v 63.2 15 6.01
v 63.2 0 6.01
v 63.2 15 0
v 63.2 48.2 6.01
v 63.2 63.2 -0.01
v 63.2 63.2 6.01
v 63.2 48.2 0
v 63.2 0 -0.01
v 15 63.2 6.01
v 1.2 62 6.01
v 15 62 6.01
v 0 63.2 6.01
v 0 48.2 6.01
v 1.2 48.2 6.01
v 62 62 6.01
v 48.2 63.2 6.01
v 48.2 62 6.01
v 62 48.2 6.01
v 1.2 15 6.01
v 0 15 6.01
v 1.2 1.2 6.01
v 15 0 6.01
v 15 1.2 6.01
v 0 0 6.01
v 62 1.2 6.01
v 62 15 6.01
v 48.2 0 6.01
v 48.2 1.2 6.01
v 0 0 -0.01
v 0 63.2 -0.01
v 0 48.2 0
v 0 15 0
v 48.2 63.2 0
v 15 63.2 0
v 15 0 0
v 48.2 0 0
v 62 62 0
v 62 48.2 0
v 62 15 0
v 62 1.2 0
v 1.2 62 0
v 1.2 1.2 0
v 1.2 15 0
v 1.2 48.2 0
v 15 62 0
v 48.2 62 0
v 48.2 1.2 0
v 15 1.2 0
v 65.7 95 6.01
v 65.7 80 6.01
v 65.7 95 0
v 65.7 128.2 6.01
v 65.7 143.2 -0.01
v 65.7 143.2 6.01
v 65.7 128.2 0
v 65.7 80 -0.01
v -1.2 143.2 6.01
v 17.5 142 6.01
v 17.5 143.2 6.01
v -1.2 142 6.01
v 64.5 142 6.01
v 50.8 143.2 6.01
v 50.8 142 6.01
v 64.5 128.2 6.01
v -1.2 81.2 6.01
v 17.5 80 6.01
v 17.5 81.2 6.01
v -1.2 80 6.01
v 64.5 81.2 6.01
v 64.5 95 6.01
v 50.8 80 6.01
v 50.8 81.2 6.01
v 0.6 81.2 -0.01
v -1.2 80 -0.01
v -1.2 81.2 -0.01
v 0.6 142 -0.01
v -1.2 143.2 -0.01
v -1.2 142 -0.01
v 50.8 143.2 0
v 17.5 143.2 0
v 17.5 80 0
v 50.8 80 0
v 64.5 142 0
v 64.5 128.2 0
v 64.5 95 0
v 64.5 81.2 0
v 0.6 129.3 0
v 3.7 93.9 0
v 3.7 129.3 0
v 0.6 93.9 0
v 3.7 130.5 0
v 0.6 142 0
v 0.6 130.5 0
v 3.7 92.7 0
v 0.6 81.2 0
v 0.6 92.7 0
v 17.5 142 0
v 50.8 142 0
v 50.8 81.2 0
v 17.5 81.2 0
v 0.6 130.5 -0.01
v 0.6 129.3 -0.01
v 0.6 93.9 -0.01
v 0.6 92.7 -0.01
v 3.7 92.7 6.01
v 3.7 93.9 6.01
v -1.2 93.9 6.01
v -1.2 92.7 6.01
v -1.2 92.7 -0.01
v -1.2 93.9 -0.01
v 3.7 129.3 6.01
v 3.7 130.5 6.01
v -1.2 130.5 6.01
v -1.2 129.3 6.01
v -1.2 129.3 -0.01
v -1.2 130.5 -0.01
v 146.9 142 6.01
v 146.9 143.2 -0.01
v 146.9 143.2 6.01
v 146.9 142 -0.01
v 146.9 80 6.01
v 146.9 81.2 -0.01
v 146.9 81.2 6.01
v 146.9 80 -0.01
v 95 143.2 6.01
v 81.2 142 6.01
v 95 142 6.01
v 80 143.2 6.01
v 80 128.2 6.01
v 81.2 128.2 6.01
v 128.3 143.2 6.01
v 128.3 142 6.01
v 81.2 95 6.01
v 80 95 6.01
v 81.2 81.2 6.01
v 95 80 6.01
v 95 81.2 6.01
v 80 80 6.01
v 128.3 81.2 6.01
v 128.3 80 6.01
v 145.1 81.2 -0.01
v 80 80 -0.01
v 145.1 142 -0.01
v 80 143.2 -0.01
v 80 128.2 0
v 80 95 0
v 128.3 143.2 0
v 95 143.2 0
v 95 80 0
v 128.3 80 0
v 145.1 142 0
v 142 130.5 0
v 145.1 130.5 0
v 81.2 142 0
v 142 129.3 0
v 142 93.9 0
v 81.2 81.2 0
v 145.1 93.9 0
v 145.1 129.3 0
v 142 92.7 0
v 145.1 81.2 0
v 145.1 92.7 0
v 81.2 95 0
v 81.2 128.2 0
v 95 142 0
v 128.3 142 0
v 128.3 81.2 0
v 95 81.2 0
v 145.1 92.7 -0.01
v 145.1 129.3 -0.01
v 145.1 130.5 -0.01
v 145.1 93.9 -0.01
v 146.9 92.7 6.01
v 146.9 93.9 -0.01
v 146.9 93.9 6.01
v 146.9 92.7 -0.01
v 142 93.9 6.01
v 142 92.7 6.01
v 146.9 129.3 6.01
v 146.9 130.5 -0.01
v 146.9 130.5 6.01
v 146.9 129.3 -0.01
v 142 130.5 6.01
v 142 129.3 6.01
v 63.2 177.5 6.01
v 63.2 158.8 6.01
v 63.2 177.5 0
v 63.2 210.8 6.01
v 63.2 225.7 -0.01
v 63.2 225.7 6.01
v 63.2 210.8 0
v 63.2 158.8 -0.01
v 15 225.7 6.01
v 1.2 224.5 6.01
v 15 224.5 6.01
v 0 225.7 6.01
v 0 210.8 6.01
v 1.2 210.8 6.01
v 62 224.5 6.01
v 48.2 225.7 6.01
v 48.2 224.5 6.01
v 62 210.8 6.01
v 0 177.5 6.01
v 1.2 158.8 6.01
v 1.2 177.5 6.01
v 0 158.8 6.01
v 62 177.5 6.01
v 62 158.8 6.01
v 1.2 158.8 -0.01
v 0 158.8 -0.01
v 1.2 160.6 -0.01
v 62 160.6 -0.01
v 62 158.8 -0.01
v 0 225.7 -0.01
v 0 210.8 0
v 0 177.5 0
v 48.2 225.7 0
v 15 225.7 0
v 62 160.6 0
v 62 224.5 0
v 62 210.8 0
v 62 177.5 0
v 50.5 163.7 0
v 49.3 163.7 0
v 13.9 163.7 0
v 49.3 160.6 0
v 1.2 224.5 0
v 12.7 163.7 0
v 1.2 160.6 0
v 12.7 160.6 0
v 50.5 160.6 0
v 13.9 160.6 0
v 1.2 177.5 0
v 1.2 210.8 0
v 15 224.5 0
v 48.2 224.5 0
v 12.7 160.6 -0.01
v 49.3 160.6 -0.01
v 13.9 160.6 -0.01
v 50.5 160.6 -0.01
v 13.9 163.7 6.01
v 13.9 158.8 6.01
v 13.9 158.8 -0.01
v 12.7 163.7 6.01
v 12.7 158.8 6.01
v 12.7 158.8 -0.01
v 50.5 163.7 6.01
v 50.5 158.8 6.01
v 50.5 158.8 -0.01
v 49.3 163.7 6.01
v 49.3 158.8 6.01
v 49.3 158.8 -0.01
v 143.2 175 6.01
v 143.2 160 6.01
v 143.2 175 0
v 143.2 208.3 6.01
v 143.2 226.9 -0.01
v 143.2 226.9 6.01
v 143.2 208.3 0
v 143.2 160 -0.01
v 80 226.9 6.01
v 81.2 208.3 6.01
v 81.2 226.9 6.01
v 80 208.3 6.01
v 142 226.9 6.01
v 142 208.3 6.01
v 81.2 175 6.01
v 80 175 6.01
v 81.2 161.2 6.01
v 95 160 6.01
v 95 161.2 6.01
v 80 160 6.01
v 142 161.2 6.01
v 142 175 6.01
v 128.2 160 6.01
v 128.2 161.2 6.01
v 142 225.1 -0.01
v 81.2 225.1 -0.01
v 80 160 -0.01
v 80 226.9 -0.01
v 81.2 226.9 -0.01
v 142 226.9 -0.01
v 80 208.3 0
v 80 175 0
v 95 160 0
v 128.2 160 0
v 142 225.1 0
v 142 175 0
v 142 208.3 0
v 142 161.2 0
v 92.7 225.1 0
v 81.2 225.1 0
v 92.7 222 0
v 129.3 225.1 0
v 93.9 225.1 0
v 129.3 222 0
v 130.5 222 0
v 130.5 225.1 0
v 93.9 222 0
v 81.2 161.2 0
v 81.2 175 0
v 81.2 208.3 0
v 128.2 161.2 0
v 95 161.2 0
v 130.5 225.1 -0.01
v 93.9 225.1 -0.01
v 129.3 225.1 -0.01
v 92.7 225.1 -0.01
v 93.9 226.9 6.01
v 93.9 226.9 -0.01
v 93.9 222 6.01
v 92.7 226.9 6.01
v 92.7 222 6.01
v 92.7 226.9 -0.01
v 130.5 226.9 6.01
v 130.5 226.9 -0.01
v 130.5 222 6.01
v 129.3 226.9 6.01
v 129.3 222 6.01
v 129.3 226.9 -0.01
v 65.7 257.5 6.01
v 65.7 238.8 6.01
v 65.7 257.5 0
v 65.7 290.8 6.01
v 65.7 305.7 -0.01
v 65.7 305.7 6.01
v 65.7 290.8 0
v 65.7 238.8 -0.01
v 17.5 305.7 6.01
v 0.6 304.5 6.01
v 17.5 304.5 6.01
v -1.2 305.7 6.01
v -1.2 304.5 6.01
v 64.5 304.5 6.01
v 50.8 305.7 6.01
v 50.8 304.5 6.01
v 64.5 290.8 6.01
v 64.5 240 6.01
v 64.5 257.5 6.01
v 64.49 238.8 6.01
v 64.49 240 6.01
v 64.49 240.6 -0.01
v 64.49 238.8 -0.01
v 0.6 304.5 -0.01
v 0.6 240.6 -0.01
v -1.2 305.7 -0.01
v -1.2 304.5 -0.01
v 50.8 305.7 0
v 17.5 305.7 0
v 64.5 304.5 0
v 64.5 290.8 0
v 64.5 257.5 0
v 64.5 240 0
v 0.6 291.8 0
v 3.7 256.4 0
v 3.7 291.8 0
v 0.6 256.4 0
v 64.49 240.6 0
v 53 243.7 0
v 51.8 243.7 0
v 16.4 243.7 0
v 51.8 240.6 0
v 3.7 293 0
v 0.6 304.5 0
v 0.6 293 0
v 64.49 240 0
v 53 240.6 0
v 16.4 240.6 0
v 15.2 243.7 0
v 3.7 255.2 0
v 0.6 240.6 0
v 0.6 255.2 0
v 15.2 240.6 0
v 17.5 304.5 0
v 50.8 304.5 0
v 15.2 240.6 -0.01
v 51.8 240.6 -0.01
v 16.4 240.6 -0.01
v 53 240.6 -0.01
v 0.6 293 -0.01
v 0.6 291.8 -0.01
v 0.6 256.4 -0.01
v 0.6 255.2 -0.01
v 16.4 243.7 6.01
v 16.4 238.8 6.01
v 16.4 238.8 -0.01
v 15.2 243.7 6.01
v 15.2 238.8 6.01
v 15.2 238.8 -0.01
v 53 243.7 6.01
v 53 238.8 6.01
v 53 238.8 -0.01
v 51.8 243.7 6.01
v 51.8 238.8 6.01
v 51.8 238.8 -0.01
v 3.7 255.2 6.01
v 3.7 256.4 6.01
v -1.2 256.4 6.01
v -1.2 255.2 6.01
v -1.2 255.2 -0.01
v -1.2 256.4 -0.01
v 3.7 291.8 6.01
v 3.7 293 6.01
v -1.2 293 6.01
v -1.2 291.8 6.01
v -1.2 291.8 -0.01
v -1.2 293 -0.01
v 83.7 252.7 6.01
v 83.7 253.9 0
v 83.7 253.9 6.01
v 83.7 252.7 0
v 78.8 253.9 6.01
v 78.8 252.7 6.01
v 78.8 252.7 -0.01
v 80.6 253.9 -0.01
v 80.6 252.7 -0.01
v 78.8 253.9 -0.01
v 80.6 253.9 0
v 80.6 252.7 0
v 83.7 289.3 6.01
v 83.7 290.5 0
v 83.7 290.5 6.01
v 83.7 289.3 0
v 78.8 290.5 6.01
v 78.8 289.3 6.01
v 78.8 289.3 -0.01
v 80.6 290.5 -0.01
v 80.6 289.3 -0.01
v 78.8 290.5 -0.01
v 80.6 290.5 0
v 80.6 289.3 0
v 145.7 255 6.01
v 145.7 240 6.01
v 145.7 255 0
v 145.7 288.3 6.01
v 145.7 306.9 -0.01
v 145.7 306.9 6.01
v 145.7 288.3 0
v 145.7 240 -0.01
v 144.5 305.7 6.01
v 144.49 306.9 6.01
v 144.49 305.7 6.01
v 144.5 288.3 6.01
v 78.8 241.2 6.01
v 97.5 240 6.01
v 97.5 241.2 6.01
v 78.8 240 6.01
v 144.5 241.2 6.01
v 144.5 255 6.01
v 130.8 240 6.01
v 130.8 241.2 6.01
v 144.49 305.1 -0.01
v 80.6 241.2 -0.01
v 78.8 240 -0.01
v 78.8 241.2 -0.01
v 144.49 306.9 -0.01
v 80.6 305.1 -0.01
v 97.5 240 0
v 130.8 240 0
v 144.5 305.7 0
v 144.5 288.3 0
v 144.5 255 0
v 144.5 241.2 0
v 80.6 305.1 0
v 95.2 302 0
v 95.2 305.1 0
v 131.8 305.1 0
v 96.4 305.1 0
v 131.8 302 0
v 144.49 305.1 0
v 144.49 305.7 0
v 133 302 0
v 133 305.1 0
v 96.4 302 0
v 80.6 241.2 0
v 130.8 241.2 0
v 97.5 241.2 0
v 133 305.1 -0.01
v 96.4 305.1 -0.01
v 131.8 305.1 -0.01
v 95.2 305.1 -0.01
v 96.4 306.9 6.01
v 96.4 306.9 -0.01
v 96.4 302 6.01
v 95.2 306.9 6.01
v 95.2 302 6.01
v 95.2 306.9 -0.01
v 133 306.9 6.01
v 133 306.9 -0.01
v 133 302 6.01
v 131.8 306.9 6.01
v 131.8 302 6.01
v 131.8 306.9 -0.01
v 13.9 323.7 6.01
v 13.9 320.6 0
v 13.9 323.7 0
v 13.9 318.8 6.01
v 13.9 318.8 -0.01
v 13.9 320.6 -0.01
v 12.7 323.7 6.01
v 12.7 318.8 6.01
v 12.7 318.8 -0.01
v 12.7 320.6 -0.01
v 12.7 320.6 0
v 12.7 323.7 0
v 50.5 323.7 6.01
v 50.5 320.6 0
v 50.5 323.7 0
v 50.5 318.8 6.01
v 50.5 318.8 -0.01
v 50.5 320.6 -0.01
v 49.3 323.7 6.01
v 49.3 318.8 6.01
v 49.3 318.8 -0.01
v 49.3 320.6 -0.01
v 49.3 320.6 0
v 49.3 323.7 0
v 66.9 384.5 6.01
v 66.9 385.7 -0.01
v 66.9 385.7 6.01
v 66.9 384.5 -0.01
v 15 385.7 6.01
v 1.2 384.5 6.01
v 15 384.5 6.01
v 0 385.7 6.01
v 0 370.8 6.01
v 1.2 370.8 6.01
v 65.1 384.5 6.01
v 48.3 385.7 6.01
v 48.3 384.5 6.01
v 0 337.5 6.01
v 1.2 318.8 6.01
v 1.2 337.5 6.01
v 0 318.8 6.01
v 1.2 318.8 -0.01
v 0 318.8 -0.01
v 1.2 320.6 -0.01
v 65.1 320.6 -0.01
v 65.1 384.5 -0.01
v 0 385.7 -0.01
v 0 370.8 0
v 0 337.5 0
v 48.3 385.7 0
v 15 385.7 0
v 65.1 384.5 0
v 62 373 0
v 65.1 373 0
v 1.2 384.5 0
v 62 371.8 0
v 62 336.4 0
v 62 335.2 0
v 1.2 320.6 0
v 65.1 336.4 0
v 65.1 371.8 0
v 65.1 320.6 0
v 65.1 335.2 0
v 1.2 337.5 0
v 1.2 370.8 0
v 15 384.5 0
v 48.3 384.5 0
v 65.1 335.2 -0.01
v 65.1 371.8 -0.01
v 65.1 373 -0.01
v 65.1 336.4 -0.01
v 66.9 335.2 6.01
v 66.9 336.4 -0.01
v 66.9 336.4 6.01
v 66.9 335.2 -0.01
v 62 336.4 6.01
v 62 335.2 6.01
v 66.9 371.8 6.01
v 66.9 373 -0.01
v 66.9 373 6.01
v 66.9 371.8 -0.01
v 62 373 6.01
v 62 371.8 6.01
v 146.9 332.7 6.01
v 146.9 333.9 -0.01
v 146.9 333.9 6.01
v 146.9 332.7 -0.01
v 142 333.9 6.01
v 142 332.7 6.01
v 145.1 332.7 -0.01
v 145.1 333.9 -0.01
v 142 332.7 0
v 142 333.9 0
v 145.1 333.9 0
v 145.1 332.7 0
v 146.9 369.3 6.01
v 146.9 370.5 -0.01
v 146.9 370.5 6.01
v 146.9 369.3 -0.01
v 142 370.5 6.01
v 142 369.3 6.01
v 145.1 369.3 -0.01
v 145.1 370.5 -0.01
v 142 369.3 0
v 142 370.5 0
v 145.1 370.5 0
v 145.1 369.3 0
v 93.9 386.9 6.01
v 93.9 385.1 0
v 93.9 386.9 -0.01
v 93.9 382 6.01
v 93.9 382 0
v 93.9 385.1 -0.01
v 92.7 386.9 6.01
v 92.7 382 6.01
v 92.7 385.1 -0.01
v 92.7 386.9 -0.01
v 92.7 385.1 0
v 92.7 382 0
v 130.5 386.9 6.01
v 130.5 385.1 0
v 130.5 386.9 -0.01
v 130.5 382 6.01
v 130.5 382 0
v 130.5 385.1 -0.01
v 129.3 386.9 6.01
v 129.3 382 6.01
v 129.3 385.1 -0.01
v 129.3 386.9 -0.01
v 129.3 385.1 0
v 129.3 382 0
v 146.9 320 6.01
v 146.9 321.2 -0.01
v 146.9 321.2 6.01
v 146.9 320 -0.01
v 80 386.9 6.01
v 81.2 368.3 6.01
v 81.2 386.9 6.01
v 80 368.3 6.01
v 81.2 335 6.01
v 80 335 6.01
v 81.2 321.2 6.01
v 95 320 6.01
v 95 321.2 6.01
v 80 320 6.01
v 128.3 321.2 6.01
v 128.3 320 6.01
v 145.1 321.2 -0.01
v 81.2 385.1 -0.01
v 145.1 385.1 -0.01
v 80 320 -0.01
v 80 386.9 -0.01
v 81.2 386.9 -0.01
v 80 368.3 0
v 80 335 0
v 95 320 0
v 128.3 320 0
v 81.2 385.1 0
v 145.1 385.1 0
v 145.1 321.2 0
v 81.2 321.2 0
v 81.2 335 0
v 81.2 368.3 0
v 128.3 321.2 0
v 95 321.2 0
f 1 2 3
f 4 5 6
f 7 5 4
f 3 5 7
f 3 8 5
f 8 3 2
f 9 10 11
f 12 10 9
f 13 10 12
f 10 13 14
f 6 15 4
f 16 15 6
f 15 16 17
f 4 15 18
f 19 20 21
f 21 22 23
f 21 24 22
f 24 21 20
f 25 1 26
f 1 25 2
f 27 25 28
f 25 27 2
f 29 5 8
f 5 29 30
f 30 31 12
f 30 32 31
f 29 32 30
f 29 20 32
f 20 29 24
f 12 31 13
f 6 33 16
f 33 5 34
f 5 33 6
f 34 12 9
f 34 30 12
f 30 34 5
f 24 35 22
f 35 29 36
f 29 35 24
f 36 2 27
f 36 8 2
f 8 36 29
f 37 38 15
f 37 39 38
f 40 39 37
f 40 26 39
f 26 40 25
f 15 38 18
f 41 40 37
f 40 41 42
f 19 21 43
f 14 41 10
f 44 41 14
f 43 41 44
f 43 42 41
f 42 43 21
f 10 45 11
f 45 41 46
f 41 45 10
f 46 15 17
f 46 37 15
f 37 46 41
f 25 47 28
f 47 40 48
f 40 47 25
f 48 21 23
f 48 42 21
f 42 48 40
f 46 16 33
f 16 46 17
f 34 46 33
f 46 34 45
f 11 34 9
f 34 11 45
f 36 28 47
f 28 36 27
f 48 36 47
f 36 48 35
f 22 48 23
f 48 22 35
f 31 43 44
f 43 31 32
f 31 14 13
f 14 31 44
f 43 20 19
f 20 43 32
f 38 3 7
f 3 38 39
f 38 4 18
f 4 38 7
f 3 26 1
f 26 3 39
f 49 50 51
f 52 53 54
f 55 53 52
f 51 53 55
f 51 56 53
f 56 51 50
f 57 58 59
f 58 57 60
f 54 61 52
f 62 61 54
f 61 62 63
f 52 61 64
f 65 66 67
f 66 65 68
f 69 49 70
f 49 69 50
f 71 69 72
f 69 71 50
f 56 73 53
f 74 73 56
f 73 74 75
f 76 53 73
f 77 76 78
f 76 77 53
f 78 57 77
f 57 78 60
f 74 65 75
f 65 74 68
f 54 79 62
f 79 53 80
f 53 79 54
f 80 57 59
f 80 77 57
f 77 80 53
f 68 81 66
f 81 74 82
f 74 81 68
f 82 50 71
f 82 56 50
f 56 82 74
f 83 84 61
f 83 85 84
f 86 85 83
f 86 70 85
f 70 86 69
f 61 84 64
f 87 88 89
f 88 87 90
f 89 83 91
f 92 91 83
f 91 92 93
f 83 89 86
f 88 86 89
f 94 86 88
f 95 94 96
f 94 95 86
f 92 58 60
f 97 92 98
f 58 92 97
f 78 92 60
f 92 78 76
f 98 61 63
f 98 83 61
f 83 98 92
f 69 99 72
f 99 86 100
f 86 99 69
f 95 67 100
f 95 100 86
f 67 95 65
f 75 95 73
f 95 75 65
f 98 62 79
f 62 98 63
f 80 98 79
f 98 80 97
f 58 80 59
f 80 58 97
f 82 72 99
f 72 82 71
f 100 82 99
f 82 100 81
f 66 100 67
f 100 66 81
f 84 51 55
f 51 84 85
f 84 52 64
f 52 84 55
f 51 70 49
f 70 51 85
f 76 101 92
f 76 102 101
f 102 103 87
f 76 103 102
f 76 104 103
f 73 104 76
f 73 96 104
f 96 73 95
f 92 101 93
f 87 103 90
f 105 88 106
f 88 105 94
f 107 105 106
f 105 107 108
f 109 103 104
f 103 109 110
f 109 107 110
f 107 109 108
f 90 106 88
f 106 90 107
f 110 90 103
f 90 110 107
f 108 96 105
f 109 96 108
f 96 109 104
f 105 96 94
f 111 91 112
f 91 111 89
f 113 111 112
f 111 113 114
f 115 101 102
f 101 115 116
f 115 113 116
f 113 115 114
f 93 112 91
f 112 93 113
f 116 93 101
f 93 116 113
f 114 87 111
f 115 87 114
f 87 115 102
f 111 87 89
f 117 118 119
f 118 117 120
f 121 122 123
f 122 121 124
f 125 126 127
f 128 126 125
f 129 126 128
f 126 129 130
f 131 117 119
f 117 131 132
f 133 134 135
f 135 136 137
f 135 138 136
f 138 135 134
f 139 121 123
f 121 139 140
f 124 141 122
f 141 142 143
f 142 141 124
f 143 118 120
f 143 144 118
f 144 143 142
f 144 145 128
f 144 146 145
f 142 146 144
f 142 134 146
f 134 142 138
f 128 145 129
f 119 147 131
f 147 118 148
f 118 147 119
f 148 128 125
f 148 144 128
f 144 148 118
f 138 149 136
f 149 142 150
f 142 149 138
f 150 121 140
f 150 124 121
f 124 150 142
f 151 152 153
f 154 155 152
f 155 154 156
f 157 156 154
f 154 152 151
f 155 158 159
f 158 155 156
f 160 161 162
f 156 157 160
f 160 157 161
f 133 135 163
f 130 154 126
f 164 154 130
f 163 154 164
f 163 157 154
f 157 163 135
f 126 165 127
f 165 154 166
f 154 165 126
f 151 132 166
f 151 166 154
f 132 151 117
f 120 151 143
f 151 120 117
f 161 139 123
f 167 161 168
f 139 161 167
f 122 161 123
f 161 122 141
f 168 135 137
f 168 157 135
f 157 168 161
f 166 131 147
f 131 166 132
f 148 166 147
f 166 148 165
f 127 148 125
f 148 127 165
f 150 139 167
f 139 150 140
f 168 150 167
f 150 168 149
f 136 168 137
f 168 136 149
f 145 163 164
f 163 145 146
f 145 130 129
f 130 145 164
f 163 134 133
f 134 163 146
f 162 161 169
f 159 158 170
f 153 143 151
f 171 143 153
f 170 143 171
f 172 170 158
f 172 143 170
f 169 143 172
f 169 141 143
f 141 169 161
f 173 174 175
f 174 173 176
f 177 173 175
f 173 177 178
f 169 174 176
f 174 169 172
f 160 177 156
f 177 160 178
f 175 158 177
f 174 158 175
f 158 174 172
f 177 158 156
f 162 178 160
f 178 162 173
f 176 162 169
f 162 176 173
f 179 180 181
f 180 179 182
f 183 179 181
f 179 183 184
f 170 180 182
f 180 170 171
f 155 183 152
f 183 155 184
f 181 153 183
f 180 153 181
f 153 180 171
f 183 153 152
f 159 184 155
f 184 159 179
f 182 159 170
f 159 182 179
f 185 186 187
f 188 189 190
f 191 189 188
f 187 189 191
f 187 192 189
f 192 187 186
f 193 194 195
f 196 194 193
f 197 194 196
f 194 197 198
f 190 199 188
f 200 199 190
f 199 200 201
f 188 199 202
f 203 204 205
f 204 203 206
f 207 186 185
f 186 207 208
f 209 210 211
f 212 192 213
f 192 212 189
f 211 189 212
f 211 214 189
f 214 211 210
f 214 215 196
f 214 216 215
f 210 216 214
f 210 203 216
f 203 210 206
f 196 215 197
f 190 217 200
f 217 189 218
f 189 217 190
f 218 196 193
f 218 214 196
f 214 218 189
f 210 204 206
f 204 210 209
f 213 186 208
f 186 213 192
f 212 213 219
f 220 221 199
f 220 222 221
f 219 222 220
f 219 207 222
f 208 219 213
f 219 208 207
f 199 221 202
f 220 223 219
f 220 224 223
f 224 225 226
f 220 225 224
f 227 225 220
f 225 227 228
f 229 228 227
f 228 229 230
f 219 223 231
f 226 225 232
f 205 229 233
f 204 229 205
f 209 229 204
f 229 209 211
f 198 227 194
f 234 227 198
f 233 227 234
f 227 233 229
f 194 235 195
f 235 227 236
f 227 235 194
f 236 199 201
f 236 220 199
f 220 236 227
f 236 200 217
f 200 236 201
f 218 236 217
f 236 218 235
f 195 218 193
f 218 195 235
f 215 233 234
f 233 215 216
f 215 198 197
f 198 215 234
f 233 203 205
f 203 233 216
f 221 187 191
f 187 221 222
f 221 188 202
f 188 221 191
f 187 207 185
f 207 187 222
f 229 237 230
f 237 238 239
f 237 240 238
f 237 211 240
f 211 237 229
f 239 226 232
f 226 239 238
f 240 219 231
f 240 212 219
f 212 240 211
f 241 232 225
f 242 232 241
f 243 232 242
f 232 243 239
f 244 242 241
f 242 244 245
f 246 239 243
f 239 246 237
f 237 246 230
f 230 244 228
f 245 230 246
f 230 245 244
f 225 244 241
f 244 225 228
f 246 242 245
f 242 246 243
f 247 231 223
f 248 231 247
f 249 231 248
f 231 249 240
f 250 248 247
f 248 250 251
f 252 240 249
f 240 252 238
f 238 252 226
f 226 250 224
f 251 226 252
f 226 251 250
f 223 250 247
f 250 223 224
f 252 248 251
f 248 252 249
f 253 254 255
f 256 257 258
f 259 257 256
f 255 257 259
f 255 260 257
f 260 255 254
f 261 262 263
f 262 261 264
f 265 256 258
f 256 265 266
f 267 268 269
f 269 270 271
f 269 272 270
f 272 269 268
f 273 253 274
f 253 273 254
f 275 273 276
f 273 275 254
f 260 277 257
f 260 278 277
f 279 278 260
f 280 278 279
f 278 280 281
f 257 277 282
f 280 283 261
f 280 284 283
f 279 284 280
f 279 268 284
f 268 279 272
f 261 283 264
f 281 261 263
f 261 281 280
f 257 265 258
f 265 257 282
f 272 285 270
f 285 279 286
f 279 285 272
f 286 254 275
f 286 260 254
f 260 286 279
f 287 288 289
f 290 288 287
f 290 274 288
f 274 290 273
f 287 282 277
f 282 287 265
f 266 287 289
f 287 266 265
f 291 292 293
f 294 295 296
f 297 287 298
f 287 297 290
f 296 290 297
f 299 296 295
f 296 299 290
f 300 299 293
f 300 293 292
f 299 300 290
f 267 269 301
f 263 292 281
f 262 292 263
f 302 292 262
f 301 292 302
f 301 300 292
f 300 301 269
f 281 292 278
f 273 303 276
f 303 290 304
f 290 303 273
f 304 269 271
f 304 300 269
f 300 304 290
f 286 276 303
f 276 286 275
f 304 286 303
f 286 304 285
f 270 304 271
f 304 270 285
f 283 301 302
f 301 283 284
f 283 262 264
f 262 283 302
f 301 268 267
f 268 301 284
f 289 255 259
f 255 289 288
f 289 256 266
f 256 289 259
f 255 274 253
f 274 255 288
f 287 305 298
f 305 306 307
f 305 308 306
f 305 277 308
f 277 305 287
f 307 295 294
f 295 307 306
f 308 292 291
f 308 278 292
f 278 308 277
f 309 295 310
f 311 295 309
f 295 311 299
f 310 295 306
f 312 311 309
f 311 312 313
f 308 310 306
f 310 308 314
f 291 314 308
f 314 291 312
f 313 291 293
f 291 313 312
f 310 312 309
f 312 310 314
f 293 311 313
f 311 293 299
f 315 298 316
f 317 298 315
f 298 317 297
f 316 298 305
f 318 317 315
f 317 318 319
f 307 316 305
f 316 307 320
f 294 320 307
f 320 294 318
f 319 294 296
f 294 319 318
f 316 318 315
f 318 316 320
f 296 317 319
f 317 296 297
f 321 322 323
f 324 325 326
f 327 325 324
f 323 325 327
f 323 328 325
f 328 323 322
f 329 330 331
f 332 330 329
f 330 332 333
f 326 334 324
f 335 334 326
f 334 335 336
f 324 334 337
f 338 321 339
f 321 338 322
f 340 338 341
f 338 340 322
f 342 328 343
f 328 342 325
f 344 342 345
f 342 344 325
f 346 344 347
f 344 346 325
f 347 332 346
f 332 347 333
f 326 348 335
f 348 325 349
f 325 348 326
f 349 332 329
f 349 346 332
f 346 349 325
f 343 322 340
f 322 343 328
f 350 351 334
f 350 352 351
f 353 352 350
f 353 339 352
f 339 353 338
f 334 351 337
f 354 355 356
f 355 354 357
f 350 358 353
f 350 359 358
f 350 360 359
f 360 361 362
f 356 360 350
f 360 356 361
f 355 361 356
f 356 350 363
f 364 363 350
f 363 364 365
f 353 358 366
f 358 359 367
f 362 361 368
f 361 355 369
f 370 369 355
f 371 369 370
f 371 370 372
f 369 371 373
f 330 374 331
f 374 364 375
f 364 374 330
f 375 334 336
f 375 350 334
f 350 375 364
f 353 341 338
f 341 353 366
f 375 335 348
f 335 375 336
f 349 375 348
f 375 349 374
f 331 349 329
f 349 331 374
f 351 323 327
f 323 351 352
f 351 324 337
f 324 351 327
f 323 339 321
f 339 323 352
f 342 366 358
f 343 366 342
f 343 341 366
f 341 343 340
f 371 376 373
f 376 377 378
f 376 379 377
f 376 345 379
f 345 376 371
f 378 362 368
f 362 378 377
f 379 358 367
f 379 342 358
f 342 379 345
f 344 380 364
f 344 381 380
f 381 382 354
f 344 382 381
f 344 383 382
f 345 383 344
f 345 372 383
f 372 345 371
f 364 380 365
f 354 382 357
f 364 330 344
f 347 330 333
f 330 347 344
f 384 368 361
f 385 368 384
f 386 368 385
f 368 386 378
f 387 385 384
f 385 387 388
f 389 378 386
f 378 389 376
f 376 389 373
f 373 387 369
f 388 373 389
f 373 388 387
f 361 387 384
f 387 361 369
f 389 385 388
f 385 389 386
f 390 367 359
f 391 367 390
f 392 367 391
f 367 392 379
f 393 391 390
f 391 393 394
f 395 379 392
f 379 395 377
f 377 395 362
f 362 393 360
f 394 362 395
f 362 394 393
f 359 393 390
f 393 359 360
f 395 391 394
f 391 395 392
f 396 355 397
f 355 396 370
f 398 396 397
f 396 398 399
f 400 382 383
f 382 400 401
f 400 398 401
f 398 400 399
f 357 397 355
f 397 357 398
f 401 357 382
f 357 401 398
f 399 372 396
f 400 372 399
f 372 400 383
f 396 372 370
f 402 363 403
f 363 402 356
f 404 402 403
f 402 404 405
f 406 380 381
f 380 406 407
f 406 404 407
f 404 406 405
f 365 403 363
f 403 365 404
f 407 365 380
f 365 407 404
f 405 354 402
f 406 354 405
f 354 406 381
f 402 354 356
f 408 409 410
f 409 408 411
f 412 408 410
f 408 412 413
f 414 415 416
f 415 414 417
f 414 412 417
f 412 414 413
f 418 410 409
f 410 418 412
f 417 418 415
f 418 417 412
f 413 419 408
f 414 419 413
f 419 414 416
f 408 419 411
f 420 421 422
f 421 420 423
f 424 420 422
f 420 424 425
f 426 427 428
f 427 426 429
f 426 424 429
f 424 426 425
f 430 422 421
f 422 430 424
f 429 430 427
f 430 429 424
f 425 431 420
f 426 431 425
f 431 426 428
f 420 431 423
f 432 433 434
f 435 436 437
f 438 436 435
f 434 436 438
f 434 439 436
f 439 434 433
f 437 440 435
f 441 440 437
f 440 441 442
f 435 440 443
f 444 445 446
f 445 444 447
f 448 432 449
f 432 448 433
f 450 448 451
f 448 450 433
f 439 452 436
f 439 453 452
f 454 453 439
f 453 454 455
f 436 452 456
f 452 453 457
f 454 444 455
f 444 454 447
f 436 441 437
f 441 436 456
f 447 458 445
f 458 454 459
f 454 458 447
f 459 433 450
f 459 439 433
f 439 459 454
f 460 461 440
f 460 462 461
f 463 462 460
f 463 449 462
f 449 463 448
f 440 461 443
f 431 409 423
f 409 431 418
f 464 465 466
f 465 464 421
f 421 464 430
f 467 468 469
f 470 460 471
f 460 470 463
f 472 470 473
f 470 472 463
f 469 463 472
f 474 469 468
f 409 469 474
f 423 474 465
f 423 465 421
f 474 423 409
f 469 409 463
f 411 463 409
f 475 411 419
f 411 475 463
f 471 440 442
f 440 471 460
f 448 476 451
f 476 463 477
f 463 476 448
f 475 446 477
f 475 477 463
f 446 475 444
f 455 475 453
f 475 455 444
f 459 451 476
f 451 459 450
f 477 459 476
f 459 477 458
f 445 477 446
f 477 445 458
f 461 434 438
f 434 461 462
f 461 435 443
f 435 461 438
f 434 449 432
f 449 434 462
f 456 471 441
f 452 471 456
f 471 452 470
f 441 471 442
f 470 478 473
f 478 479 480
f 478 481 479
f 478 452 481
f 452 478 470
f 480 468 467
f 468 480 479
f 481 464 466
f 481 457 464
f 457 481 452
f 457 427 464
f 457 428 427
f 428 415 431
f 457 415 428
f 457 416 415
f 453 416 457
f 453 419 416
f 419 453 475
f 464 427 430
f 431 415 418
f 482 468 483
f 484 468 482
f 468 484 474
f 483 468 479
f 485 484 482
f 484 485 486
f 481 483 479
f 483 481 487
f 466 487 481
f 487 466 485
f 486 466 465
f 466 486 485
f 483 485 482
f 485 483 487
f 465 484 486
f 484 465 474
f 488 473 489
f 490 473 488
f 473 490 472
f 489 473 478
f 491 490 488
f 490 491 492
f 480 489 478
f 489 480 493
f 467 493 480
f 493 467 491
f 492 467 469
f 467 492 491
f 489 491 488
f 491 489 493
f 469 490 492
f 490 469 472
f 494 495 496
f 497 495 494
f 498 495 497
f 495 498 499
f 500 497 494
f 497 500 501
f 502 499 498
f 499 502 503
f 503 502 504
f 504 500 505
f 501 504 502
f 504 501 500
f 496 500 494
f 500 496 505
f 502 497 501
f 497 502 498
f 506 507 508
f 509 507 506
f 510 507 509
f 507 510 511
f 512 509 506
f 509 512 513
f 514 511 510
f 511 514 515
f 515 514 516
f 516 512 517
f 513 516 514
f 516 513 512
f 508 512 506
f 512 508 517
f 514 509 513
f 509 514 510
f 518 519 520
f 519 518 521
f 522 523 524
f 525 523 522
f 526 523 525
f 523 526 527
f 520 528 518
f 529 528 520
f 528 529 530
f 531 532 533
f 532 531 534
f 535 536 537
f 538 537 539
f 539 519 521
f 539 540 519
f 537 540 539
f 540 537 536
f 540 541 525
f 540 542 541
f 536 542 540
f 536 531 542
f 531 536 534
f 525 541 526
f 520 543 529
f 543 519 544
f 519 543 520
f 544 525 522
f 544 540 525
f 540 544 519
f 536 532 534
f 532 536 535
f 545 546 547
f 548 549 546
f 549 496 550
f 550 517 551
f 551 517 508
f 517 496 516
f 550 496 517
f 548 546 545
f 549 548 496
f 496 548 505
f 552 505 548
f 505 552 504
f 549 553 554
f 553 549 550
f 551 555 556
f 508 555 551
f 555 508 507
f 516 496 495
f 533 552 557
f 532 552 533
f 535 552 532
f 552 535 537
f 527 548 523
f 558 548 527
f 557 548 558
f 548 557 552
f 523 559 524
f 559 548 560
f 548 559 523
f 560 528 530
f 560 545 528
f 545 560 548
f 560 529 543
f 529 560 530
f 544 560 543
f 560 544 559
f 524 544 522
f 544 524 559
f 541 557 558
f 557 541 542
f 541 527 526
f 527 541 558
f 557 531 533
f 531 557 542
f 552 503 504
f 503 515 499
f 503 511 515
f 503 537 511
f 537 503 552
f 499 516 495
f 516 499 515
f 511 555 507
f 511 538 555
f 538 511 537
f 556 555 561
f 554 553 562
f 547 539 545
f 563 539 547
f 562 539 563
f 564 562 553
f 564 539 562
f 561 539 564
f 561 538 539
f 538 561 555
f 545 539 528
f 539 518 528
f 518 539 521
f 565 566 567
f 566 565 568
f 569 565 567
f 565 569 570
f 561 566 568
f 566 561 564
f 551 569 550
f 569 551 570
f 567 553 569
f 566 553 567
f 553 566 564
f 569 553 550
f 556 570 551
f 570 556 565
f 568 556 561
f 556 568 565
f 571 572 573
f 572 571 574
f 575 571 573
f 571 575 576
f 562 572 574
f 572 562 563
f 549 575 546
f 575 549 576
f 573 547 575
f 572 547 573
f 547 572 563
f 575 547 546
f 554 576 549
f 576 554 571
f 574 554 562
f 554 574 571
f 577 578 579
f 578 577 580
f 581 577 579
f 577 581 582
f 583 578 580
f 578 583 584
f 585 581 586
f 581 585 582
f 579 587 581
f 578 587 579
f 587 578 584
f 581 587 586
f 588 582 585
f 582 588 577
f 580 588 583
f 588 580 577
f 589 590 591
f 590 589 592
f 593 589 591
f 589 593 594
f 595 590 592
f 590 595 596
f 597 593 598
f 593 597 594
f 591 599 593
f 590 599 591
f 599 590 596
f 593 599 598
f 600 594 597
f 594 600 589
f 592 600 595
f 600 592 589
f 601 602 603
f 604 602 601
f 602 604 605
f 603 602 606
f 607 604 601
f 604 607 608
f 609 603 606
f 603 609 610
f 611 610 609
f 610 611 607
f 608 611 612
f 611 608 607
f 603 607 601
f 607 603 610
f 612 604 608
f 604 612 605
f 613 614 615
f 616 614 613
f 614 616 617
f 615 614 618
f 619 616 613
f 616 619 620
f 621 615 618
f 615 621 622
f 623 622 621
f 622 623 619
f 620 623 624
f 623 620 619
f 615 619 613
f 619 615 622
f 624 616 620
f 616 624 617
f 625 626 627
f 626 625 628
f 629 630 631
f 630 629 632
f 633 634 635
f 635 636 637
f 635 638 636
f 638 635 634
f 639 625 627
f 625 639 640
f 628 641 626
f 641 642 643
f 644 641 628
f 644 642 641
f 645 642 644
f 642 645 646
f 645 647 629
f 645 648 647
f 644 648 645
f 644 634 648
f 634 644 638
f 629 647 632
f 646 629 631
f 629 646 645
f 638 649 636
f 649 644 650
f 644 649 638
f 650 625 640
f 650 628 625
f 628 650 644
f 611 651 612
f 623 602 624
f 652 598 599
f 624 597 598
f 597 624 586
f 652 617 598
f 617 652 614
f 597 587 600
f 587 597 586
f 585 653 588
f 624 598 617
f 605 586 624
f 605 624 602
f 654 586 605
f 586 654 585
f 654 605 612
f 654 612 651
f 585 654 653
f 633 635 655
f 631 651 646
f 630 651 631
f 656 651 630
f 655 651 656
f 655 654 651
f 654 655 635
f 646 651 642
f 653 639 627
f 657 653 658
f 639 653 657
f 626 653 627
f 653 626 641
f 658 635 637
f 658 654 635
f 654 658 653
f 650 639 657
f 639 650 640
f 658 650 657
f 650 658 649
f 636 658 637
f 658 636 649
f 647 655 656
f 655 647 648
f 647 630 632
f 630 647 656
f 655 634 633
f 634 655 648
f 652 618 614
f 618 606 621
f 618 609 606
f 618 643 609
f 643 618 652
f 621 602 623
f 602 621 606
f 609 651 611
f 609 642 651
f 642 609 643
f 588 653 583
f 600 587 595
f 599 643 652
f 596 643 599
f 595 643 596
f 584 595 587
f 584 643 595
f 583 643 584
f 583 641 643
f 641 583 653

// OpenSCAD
// file: ../../Base/Boxes.scad
// Fischertechnik Box Foundation
// Pre-designed Boxes

use <Constants.scad>

include <PlacementOptions.scad>

box190Width = 190;
box190Depth = 130;
box130Width = 130;
box130Depth = 95;
boxUsageHeight = 33.9;
boxWallThickness = 2.4;
boxBaseThickness = 1.0;

// getBoxWallThickness()
// Gets the wall thickness of a Fischertechnik Box

function getBoxWallThickness() = boxWallThickness;

// Gets the usable height of a fischertechnik box
function getBoxUsageHeight() = boxUsageHeight;

// Gets the thickness of the Fischertechnik box base.
function getBoxBaseThickness() = boxBaseThickness;

// Gets the usable inner space of a Box 190 as an x/y-list
function getBox190Space() = [
    box190Width - 2*getBoxWallThickness(), 
    box190Depth - 2*getBoxWallThickness() ];

// Imports the Fischertechnik empty box 130x190 mm and places it at position 0,0
// 190x130 are the outer sizes, the inner space is slightly smaller. Use getBox190Space() to get the inner sizes.
// This module needs the STL file "Fischertechnik Box 130x190.stl" in the library path.
// The box is positioned that the usable inner space is at the 0,0,0 position. The

module Box190() {
    translate([-getBoxWallThickness(),-getBoxWallThickness(),-getBoxBaseThickness()])
        import("Fischertechnik Box 130x190.stl", convexity=3);
}

// Gets the usable inner space of a Box 130 as an x/y-list
function getBox130Space() = [
    box130Width - 2*getBoxWallThickness(), 
    box130Depth - 2*getBoxWallThickness() ];

// Imports the Fischertechnik empty box 95x130 mm and places it at position 0,0
// 190x130 are the outer sizes, the inner space is slightly smaller. Use getBox190Space() to get the inner sizes.
// This module needs the STL file "Fischertechnik Box 95x130.stl" in the library path.
// The box is positioned that the usable inner space is at the 0,0,0 position. The

module Box130() {
    translate([-getBoxWallThickness(),-getBoxWallThickness(),-getBoxBaseThickness()])
        import("Fischertechnik Box 95x130.stl", convexity=3);
}

// Creates a web at the specified box walls
// corner 0 = LowerLeft, 1 = UpperLeft, 2 = UpperRight, 3 = LowerRight
// side 0 = LeftOfCorner, 1 = RightOfCorner
// distance = Distance in mm from the corner
// box = inner width and depth of the box (default: Box 190)
// webWidth = length of the web (default is 3 mms)
// webThickness = thickness of the web (default is 1 mm)

module BoxWeb(corner, side, distance, box=getBox190Space(), webWidth=3, webThickness=1.0) {
    sink = getBoxWallThickness()/2;

    width = (corner % 2 == 0) ? 
            (side == LeftOfCorner ? webWidth : webThickness) :
            (side == LeftOfCorner ? webThickness : webWidth);

    depth = (corner % 2 == 0) ? 
            (side == RightOfCorner ? webWidth : webThickness) :
            (side == RightOfCorner ? webThickness : webWidth);
    
    xDiff = corner == LowerLeft ? 
                (side == LeftOfCorner ? -sink : distance) :
            (corner == UpperLeft ?                
                (side == LeftOfCorner ? distance : -sink) :
            (corner == UpperRight ?
                (side == LeftOfCorner ? box.x-webWidth+sink : box.x-distance-webThickness) :
                (side == LeftOfCorner ? box.x-distance-webThickness: box.x-webWidth+sink)));

    yDiff = corner == LowerLeft ? 
                (side == RightOfCorner ? -sink : distance) :
            (corner == UpperLeft ?
                (side == RightOfCorner ? box.y-distance : box.y-webWidth+sink) :
            (corner == UpperRight ?
                (side == RightOfCorner ? box.y-webWidth+sink : box.y-distance) :
                (side == RightOfCorner ? distance : -sink)));
    
    translate([xDiff, yDiff, -getExcess()])
        cube([width, depth, boxUsageHeight + 2*getExcess()]);
}
// file: ../../Base/Rotation.scad
// Fischertechnik Box Foundation
// Geometry Helpers Rotation

include <PlacementOptions.scad>

// getRotatedSpace(space, rotation=NoRotation)
// Rotates the space dependent on the specified rotation

function getRotatedSpace(space, rotation=NoRotation) = [
    (rotation == Rotate90 || rotation == Rotate270) ? space.y : space.x,
    (rotation == Rotate90 || rotation == Rotate270) ? space.x : space.y
];

// Rotates the given space around the fixed left lower corner
// space = the space the children needs as width/depth list [width,depth]
// rotation = 0 Rotate0 degrees, 1 Rotate90 degrees, 2 Rotate180 degrees, 3 Rotate270 degrees (equivalent to -90)

module RotateFix(space, rotation=Rotate0) {
    dy = (rotation == Rotate0 || rotation == Rotate270) ? 0 :
        (rotation == Rotate90) ? space.x :
        space.y;
    dx = (rotation < Rotate180) ? 0 :
        (rotation == Rotate180) ? space.x :
        space.y;
    
    translate([dx, dy, 0])
        rotate([0, 0, rotations[rotation]])
            children();
}
// file: ../../Base/Alignment.scad
// Fischertechnik Box Foundation
// Geometry Helpers Alignment

include <PlacementOptions.scad>

// getAlignedX(elementWidth, spaceWidth, align=AlignRight, offset=0)
// Gets the aligned X offset of an element with the given
// width in the given space.
// elementWidth = The width of the element to positon
// spaceWidth = The space where the element should be aligned
// align = 0 AlignLeft, 1 AlignCenter, 2 AlignRight
// offset = an optional offset from the aligned position. When
// aligned left or centered, then positive values are in X direction.
// When aligned right then positive values are in negative X direction.

function getAlignedX(elementWidth, spaceWidth, align=AlignRight, offset=0) =
    (align == AlignLeft) ?
        offset :
        ((align == AlignCenter) ?
        (spaceWidth - elementWidth)/2 + offset :
        spaceWidth - offset - elementWidth);

// getAlignedY(elementDepth, spaceDepth, align=AlignTop, offset=0)
// Gets the aligned Y offset of an element with the given
// depth in the given space.
// elementDepth = The depth of the element to positon
// spaceDepth = The space where the element should be aligned
// align = 0 AlignBottom, 1 AlignCenter, 2 AlignTop
// offset = an optional offset from the aligned position. When
// aligned bottom or centered, then positive values are in Y direction.
// When aligned top then positive values are in negative Y direction.

function getAlignedY(elementDepth, spaceDepth, align=AlignTop, offset=0) =
    (align == AlignBottom) ?
        offset :
        ((align == AlignCenter) ?
        (spaceDepth - elementDepth)/2 + offset :
        spaceDepth - offset - elementDepth);
// file: ../../Base/Constants.scad
// Fischertechnik Box Foundation
// Constants

// Constant values necessary for multiple elements

// Base constants
dividerThickness = 1.2;
excess = 0.01;
fragments = 90;
tolerance = 0.8;

// Gets the thickness of a divider 
function getDividerThickness() = dividerThickness;

// Gets the excess that is used to merge walls into each other
function getExcess() = excess;

// Gets amount of fragments of a cylinder
function getFragments() = fragments;

// Gets the inner tolerance of a frame to each side
function getTolerance() = tolerance;


// Fischertechnik specific constants
axisDiameter = 4;
axisBottomDiameter = axisDiameter + 1;
standardEdgeDistance = 2.5;
standardWebDistance = 11.5;
standardCornerLength = 15;
tubeWallFactor = 1.6;

// Gets axis diameter
function getAxisDiameter() = axisDiameter;

// Gets axis bottom diameter for thicker part at the bottom
function getAxisBottomDiameter() = axisBottomDiameter;

// gets the standard distance to the wall of the box for dockable frames with webs
function getStandardEdgeDistance() = standardEdgeDistance;

// gets the standard distance of each web to the corner of the dockable frame
function getStandardWebDistance() = standardWebDistance;

// gets the standard length of the corner walls of a dockable frame
function getStandardCornerLength() = standardCornerLength;

// gets the wall thickness of a tube.
function getTubeWallThickness() = tubeWallFactor * getDividerThickness();
// file: ../../Base/PlacementOptions.scad
// Fischertechnik Box Foundation
// Placement Options

// Alignment
NoAlign = 0;
AlignLeft = 1;
AlignBottom = 2;
AlignCenter = 3;
AlignRight = 4;
AlignTop = 5;

// Element rotation degree steps
rotations = [0, -90, -180, -270];

// Rotation
NoRotation = 0;
Rotate0 = 0;
Rotate90 = 1;
Rotate180 = 2;
Rotate270 = 3;

// Docking (seen from above)
NoDock = -1;
DockLeft = 0;
DockTop = 1;
DockRight = 2;
DockCorner = 2;
DockBottom = 3;

// Web corners
LowerLeft = 0;
UpperLeft = 1;
UpperRight = 2;
LowerRight = 3;

// Web position relative to corner
LeftOfCorner = 0;
RightOfCorner = 1;
// file: ../../Elements/FrameCassette.scad
// Fischertechnik Box Library
// Frame for Cassette
// 36518

use <../Base/Constants.scad>
use <../ModelBase/Simple.scad>
use <../ModelBase/Complex.scad>

include <../Base/PlacementOptions.scad>

width = 60;
depth = 60;
height = 6;


// getFrameCassetteSpace(alignX, alignY)
// alignX 0=NoAlign 1=AlignLeft 3=AlignCenter 4=AlignRight 
// alignY 0=AlignNo 2=AlignBottom 3=AlignCenter 5=AlignTop
// Gets the space the frame for a cassette needs as width and depth(.x and .y as a list). 

function getFrameCassetteSpace(alignX=NoAlign, alignY=NoAlign) = 
    getDockableEdgedFrameSpace([width, depth, height], alignX, alignY);

// FrameCassette(alignX, alignY)
// Frame for cassette.
// alignX 0=NoAlign 1=AlignLeft 3=AlignCenter 4=AlignRight 
// alignY 0=AlignNo 2=AlignBottom 3=AlignCenter 5=AlignTop

module FrameCassette(alignX=NoAlign, alignY=NoAlign) {
    DockableEdgedFrame([width, depth, height], alignX, alignY);
}

// Test
color("lightgray") {
    FrameCassette();
}
// file: ../../Base/Placement.scad
// Fischertechnik Box Foundation
// Geometry Helpers Placement

use <Constants.scad>
use <Alignment.scad>
use <Rotation.scad>
use <Boxes.scad>

include <PlacementOptions.scad>

// Place(x=0, y=0, elementSpace=[0,0], alignX=AlignLeft, alignY=AlignBottom, rotation=Rotate0, boxSpace=getBox190Space())
// Places the child at the specified position
// y = Y-Position. This is a relative position when an X aligment is specified.
// x = X-Position. This is a relative position when an Y aligment is specified.
// elementSpace = space of the element to be placed [x,y]
// alignX = -1=NoAlign, 0 AlignLeft, 1 AlignCenter, 3 AlignRight (elementSpace and boxSpace required!)
// alignY = -1=NoAlign, 2 AlignBottom, 1 AlignCenter, 4 AlignTop (elementSpace and boxSpace required!)
// rotation = 0 Rotate0 0 degrees, 1 Rotate90 90 degrees, 
// 2 Rotate180 180 degrees, 3 Rotate270 270 degrees (equivalent to -90)
// boxSpace = Inner space of the box where the placement occurs [x,y] - default is Box 190x130 inner space

module Place(x=0, y=0, elementSpace=[0,0], 
  alignX=AlignLeft, alignY=AlignBottom, 
  rotation=NoRotation, boxSpace=getBox190Space()) {

    module Position(x, y, space, rotation=Rotate0) {
        translate([x, y, 0])
            RotateFix(space, rotation)
                children(0);
    }

    space = getRotatedSpace(elementSpace, rotation);
    alignedX = getAlignedX(space.x, boxSpace.x, alignX, x);
    alignedY = getAlignedY(space.y, boxSpace.y, alignY, y);
    Position(alignedX, alignedY, elementSpace, rotation)
        children(0);
}

// Center(space=getBox130Space(), elementSpace=[0,0])
// space = Space where the children is centered. For cylinder use centered=true and no elementSpace.
// elementSpace = space of the element to be centered [x,y]

module Center(space=getBox190Space(), elementSpace=[0,0]) {
    translate([(space.x - elementSpace.x) / 2, (space.y - elementSpace.y) / 2])
        children(0);
}

// CenterHorizontal(width=0, y=0, offset=0, space=getBox130Space())
// space = Space where the children is centered. For cylinder use centered=true and no elementSpace.
// elementSpace = space of the element to be centered [x,y]

module CenterHorizontal(width=0, y=0, offset=0, space=getBox190Space()) {
    translate([(space.x - width) / 2 + offset, y])
        children(0);
}

// CenterVertical(depth=0, x=0, offset=0, space=getBox130Space())
// space = Space where the children is centered. For cylinder use centered=true and no elementSpace.
// elementSpace = space of the element to be centered [x,y]

module CenterVerticalal(depth=0, x=0, offset=0, space=getBox190Space()) {
    translate([x, (space.y - depth) / 2 + offset])
        children(0);
}
// main file
// Fischertechnik Box Foundation
// Elements
// Test FrameCassette

use <../../Base/Placement.scad>
use <../../Elements/FrameCassette.scad>

include <../../Base/PlacementOptions.scad>

FrameCassette();

Place(0, 80)
    FrameCassette(alignX=AlignLeft);

Place(80, 80)
    FrameCassette(alignX=AlignRight);

Place(0, 160)
    FrameCassette(alignY=AlignBottom);

Place(80, 160)
    FrameCassette(alignY=AlignTop);

Place(0, 240)
    FrameCassette(alignX=AlignLeft, alignY=AlignBottom);

Place(80, 240)
    FrameCassette(alignX=AlignLeft, alignY=AlignTop);

Place(0, 320)
    FrameCassette(alignX=AlignRight, alignY=AlignBottom);

Place(80, 320)
    FrameCassette(alignX=AlignRight, alignY=AlignTop);
